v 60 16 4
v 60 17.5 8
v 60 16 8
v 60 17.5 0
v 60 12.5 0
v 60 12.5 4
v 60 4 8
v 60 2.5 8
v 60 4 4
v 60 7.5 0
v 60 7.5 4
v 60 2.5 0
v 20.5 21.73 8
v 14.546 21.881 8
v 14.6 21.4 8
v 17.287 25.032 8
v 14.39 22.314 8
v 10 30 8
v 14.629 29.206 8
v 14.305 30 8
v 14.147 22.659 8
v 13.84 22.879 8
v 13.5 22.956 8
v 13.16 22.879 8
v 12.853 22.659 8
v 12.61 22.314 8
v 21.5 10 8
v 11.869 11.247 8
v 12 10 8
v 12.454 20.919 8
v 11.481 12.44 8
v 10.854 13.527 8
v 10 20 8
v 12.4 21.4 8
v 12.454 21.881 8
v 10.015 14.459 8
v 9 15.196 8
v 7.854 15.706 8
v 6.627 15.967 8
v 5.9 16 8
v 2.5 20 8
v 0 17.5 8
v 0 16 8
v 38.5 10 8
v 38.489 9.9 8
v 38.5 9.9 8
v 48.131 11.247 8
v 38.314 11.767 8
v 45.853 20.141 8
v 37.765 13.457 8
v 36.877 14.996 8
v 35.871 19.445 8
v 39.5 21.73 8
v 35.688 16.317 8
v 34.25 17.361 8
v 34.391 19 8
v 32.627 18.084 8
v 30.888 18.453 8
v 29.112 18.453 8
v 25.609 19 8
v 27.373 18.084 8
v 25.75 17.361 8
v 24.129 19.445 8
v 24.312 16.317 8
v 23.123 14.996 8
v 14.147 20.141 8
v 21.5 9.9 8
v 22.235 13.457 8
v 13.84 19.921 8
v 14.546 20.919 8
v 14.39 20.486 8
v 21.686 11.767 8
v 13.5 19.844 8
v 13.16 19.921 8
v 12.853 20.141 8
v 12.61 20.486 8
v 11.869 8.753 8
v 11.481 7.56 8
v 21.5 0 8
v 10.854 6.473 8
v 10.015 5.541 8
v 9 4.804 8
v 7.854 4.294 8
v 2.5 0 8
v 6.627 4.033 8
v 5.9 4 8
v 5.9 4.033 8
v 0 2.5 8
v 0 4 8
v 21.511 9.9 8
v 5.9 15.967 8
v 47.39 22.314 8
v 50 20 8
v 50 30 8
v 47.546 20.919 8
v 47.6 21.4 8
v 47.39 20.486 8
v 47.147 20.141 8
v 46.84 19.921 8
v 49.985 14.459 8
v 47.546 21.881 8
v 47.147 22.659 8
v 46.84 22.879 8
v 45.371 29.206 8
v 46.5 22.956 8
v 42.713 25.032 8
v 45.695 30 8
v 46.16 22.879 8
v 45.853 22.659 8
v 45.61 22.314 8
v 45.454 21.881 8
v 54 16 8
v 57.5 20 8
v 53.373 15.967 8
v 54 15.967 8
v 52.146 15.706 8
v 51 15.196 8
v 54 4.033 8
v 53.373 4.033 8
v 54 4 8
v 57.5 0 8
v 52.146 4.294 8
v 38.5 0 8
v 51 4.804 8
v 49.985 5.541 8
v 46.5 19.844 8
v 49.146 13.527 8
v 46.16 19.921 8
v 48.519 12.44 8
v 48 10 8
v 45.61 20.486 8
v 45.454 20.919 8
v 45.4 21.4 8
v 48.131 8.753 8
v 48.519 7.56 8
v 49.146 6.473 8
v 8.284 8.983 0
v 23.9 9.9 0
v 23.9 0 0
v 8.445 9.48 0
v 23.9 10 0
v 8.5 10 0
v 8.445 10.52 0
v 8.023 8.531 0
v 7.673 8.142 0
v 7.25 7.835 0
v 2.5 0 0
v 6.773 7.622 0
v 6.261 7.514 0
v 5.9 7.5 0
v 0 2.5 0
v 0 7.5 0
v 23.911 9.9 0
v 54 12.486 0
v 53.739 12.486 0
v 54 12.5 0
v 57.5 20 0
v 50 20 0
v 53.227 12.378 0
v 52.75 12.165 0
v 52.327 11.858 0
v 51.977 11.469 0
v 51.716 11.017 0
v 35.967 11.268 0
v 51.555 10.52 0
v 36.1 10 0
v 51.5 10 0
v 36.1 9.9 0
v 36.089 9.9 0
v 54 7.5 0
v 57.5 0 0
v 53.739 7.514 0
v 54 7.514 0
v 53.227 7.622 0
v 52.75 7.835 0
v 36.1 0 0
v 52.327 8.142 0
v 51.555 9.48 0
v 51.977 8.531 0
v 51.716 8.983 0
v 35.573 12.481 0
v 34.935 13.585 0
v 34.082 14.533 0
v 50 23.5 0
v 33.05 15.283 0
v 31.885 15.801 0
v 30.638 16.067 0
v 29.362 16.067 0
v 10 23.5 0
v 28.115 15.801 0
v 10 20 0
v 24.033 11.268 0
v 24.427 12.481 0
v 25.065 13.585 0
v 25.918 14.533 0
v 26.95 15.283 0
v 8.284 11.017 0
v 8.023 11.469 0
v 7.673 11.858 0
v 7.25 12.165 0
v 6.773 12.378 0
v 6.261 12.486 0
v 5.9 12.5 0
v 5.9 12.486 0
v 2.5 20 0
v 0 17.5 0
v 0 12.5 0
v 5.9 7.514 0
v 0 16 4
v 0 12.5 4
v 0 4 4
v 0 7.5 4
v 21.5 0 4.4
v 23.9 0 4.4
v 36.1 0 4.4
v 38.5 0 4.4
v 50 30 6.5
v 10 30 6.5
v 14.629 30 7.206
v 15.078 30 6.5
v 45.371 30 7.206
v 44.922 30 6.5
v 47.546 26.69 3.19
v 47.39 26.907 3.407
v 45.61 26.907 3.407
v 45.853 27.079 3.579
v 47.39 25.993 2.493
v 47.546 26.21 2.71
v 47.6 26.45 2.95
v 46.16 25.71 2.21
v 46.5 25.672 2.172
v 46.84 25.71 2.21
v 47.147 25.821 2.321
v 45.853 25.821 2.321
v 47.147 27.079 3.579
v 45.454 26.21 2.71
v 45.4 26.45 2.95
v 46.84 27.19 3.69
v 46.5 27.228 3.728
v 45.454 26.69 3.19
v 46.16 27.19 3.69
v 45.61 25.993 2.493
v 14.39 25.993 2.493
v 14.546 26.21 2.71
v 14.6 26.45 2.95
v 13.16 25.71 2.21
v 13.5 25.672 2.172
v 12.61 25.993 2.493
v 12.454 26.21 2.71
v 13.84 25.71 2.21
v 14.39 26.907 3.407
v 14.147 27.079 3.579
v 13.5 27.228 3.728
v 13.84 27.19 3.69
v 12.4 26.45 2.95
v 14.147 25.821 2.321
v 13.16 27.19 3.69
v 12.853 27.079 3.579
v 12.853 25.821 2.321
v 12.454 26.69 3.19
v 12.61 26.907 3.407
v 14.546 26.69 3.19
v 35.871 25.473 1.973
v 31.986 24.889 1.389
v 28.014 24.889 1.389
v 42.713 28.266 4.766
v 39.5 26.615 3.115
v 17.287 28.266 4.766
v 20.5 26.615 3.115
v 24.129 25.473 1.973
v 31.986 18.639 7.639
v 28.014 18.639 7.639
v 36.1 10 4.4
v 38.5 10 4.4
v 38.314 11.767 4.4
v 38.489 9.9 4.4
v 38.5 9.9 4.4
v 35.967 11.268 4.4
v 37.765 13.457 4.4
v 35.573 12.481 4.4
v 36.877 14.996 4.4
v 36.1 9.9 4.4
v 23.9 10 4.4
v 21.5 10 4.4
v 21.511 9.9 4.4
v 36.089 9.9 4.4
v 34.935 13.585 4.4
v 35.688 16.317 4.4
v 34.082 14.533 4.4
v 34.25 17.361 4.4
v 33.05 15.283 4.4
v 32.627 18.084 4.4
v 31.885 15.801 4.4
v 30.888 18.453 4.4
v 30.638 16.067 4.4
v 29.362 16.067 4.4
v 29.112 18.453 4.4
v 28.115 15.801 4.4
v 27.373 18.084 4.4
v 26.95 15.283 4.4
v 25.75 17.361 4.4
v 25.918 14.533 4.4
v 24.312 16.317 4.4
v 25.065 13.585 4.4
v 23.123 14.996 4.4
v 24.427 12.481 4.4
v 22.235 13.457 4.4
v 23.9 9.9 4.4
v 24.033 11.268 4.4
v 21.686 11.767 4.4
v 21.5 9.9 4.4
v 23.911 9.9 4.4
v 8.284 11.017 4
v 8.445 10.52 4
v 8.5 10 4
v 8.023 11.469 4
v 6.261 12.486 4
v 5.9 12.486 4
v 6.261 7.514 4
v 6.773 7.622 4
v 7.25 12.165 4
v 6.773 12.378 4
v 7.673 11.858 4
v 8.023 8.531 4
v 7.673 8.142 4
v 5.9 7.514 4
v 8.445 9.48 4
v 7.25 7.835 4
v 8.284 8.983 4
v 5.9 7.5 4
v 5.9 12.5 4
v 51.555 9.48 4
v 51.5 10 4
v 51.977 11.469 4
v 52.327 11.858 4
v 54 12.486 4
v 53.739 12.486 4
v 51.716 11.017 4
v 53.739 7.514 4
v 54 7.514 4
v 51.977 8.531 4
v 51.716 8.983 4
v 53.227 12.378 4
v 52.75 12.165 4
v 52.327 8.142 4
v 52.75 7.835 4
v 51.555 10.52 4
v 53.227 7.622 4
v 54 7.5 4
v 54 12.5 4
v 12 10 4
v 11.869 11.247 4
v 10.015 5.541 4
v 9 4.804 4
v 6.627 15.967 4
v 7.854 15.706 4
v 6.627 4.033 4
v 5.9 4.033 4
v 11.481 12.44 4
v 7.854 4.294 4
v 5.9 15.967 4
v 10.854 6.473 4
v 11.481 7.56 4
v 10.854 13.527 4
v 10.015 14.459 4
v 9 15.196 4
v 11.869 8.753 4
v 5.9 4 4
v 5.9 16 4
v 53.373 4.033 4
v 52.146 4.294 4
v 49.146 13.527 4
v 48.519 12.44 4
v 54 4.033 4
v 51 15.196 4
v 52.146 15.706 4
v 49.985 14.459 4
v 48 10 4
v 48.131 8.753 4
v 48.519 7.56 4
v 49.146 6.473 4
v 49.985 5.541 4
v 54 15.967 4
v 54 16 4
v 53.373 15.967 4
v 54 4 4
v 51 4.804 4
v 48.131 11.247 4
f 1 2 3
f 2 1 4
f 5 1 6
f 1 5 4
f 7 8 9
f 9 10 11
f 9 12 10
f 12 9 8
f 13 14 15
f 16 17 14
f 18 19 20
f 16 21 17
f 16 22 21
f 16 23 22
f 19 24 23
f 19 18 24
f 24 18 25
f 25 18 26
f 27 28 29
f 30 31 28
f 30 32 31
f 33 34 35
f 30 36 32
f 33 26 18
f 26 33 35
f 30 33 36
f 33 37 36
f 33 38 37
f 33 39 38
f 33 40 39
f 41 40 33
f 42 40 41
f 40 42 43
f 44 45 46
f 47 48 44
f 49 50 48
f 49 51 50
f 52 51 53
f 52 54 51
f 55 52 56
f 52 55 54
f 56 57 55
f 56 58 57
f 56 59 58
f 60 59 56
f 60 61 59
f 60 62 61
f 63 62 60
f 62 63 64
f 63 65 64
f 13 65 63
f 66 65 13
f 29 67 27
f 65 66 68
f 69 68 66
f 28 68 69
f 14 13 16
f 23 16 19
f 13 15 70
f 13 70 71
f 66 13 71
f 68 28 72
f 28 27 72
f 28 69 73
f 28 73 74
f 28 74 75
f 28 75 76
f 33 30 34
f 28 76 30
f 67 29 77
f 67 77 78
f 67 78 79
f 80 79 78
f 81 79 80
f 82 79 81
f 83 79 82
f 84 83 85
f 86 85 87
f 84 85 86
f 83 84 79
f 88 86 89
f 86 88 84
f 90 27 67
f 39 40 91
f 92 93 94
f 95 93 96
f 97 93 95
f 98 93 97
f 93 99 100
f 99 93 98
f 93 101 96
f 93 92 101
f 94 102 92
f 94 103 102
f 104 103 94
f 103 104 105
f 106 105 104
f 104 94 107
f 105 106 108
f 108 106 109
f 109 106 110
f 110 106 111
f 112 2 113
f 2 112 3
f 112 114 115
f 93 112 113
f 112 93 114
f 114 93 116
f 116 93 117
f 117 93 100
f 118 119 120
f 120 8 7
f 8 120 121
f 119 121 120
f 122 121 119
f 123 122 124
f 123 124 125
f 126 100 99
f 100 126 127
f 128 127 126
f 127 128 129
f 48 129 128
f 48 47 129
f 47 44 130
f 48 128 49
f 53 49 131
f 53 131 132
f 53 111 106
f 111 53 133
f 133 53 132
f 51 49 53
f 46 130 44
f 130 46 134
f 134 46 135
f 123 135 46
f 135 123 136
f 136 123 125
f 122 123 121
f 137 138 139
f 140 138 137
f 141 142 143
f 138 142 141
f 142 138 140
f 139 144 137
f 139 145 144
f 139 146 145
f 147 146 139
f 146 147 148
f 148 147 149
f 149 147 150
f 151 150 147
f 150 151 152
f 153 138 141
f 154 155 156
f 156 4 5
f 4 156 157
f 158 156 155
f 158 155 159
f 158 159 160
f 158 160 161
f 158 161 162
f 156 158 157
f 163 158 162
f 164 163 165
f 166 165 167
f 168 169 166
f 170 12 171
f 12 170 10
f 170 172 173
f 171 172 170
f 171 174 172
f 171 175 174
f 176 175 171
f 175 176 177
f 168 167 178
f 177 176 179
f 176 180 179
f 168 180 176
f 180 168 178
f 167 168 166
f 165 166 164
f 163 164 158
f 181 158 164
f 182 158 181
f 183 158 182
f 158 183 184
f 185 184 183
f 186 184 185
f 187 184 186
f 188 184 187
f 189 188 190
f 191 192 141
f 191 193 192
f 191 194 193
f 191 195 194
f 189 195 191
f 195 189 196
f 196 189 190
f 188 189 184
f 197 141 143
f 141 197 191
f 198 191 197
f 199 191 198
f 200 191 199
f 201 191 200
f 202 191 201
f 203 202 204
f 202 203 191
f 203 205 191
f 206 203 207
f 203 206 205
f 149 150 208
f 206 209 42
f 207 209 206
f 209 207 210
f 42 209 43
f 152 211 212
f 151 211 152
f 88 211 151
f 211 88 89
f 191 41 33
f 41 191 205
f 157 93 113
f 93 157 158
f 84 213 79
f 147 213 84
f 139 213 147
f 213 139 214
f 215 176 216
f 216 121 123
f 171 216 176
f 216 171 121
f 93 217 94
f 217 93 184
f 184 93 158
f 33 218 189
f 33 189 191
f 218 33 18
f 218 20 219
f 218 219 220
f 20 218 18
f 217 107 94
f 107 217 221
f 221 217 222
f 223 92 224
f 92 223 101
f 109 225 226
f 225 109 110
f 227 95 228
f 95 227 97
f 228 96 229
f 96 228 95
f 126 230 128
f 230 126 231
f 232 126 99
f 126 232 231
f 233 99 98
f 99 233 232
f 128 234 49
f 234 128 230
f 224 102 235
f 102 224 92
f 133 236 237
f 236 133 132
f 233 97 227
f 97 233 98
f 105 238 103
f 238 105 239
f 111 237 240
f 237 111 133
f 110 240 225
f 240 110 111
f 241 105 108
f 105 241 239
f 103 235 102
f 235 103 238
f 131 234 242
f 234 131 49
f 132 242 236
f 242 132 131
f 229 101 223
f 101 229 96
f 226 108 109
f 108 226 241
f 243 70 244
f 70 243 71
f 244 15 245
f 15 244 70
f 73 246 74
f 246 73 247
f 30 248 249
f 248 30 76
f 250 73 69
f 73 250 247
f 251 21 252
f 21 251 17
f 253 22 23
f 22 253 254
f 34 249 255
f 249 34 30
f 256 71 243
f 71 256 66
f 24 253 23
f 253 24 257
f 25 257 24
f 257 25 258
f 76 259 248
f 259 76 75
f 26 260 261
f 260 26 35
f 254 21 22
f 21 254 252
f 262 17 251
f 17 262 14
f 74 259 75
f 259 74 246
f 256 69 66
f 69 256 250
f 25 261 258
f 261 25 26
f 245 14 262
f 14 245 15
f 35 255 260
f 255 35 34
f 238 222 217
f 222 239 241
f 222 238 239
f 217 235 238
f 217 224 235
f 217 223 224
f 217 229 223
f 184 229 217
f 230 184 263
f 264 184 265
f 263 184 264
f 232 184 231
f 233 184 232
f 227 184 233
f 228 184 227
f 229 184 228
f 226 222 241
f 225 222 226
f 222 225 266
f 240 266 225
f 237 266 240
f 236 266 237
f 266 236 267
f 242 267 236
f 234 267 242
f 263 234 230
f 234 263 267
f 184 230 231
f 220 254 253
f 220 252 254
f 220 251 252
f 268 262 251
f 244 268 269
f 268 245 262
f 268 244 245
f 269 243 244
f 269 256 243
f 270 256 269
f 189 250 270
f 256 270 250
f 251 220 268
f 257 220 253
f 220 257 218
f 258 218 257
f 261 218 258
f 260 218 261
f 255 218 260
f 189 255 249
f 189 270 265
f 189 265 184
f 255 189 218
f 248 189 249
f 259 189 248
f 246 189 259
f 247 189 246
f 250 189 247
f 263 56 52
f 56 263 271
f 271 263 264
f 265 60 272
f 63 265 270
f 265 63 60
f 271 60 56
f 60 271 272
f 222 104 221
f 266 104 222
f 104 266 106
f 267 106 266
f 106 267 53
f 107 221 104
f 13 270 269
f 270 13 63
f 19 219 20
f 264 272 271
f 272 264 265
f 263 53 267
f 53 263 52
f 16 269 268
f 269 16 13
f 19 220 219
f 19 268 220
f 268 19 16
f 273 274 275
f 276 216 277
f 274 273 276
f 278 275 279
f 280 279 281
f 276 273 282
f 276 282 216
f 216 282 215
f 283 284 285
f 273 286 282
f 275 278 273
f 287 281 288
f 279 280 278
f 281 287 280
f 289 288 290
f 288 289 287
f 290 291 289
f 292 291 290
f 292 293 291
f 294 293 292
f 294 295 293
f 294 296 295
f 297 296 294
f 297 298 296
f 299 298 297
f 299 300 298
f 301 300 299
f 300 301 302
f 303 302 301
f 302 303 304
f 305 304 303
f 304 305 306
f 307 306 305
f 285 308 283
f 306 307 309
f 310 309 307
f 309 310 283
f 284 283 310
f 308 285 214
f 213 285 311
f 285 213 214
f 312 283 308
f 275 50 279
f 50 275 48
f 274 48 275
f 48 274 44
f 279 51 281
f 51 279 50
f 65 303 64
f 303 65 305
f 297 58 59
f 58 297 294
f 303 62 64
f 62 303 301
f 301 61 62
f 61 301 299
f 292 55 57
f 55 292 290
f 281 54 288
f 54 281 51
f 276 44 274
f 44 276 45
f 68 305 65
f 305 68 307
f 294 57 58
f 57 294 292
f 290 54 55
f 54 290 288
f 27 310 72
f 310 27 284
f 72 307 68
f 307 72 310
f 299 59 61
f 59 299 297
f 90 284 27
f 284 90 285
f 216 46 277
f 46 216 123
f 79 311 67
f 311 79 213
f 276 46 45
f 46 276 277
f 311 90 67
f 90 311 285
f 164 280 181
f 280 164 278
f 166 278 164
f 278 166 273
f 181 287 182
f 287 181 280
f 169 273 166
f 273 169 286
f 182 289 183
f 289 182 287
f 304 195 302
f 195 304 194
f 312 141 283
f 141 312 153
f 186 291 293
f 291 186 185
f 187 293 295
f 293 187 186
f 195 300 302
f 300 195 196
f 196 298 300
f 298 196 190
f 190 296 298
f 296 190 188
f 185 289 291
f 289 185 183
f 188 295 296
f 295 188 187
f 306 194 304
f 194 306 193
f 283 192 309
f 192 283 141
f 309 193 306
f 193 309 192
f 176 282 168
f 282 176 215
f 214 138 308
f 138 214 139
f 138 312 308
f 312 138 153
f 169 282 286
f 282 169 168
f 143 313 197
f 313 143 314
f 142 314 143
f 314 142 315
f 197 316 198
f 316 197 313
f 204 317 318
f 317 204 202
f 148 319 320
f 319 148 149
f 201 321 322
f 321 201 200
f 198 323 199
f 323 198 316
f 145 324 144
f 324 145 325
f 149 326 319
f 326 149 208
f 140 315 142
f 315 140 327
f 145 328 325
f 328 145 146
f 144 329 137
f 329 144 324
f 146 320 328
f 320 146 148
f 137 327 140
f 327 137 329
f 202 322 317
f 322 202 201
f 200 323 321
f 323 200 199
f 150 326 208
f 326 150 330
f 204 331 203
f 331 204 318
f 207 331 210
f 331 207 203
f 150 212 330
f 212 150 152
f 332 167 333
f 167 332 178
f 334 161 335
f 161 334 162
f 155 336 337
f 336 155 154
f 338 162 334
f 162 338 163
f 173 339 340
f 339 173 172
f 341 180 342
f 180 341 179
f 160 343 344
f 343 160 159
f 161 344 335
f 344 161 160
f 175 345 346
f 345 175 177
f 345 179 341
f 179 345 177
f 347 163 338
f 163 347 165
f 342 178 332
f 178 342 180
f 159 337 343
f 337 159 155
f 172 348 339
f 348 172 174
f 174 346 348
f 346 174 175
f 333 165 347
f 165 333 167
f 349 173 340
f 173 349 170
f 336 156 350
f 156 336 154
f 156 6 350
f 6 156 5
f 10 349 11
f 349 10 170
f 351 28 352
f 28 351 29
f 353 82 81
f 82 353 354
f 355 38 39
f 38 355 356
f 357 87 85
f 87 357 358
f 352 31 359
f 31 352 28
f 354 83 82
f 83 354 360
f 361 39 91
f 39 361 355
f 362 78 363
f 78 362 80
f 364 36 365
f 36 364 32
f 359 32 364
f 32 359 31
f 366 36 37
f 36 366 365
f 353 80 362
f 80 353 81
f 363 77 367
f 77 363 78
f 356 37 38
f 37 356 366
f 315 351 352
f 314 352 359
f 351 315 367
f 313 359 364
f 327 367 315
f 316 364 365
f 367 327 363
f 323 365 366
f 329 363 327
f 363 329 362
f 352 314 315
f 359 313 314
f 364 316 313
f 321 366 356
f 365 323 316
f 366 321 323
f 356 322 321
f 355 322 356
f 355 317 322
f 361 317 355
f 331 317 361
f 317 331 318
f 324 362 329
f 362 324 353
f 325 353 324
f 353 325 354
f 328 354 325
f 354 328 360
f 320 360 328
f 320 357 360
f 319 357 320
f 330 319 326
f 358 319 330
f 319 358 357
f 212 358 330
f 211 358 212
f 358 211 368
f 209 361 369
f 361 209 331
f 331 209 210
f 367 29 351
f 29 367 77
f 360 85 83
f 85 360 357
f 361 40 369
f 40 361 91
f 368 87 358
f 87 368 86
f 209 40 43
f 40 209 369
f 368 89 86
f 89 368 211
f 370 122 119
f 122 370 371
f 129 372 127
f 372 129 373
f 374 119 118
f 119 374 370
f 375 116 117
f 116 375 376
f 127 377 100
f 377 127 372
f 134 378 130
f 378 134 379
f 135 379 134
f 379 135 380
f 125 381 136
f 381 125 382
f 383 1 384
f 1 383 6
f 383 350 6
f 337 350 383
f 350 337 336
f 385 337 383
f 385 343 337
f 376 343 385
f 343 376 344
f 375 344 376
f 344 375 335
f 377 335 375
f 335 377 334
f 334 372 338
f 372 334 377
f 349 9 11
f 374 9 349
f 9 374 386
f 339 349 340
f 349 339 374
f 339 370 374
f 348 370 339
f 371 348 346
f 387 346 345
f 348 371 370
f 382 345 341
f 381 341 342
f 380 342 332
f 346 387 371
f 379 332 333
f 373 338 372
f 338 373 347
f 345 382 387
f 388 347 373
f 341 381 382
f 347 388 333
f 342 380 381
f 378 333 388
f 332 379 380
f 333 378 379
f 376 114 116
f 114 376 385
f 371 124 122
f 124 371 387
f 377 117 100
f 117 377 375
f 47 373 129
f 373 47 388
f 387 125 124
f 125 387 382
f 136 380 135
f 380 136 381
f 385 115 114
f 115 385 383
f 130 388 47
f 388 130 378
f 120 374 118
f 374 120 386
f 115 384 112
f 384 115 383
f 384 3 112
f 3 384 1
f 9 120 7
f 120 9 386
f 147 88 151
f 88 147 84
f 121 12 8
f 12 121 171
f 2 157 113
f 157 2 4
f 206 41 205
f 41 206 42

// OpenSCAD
// RebeliX
//
// j-head mount + fan 40mm
// GNU GPL v3
// Martin Neruda
// http://www.reprap4u.cz

fan_width = 40;
fan_diameter = 38;
fan_mount = 33;

mount_height = 8;

difference(){
	union(){
	  cube([60,20,mount_height]);
	  translate([60/2-fan_width/2,20,0]) cube([fan_width,10,mount_height]);  
	}	
	// Vyrez pro ventilator
	translate([60/2-fan_width/2-0.1,20+3.5,0]) rotate([-45,0,0]) cube([fan_width+1,15,15]); 
	translate([60/2,32,21]) rotate([-135,0,0]) cylinder(r=fan_diameter/2, h=20);
	translate([60/2,20+2,7.4]){
	 translate([fan_mount/2,0,0]) rotate([-135,0,0]) cylinder(r=1.1,h=30,$fn=20,center=true);
	 translate([-fan_mount/2,0,0]) rotate([-135,0,0]) cylinder(r=1.1,h=30,$fn=20,center=true);
	}
	
	translate([30,10,4.4]) cylinder(r=8.5,h=6,$fn=30);
	translate([30-8.5,-0.1,4.4]) cube([17,10,6]);
		
	translate([30,10,-0.1]) cylinder(r=6.1,h=10,$fn=30);
	translate([30-6.1,-0.1,-0.1]) cube([12.2,10,10]);
	
	// Otvory pro prisroubovani
	translate([30-24,10,-0.1]) cylinder(r=2.5,h=10,$fn=30);
	translate([-0.1,10-2.5,-0.1]) cube([6,5,10]);
		
	translate([30+24,10,-0.1]) cylinder(r=2.5,h=10,$fn=30);
	translate([30+24,10-2.5,-0.1]) cube([7,5,10]);
	
	translate([30-24,10,4]) cylinder(r=6,h=10,$fn=30);
	translate([-0.1,10-6,4]) cube([6,12,10]);
	
	translate([30+24,10,4]) cylinder(r=6,h=10,$fn=30);
	translate([30+24,10-6,4]) cube([7,12,10]);
	
	// Seriznute rohy
	translate([2.5,0,-0.1]) rotate([0,0,135]) cube([5,5,10]);
	translate([60-2.5,0,-0.1]) rotate([0,0,-45]) cube([5,5,10]);
	translate([60,20-2.5,-0.1]) rotate([0,0,45]) cube([5,5,10]);
	translate([2.5,20,-0.1]) rotate([0,0,135]) cube([5,5,10]);
}	
